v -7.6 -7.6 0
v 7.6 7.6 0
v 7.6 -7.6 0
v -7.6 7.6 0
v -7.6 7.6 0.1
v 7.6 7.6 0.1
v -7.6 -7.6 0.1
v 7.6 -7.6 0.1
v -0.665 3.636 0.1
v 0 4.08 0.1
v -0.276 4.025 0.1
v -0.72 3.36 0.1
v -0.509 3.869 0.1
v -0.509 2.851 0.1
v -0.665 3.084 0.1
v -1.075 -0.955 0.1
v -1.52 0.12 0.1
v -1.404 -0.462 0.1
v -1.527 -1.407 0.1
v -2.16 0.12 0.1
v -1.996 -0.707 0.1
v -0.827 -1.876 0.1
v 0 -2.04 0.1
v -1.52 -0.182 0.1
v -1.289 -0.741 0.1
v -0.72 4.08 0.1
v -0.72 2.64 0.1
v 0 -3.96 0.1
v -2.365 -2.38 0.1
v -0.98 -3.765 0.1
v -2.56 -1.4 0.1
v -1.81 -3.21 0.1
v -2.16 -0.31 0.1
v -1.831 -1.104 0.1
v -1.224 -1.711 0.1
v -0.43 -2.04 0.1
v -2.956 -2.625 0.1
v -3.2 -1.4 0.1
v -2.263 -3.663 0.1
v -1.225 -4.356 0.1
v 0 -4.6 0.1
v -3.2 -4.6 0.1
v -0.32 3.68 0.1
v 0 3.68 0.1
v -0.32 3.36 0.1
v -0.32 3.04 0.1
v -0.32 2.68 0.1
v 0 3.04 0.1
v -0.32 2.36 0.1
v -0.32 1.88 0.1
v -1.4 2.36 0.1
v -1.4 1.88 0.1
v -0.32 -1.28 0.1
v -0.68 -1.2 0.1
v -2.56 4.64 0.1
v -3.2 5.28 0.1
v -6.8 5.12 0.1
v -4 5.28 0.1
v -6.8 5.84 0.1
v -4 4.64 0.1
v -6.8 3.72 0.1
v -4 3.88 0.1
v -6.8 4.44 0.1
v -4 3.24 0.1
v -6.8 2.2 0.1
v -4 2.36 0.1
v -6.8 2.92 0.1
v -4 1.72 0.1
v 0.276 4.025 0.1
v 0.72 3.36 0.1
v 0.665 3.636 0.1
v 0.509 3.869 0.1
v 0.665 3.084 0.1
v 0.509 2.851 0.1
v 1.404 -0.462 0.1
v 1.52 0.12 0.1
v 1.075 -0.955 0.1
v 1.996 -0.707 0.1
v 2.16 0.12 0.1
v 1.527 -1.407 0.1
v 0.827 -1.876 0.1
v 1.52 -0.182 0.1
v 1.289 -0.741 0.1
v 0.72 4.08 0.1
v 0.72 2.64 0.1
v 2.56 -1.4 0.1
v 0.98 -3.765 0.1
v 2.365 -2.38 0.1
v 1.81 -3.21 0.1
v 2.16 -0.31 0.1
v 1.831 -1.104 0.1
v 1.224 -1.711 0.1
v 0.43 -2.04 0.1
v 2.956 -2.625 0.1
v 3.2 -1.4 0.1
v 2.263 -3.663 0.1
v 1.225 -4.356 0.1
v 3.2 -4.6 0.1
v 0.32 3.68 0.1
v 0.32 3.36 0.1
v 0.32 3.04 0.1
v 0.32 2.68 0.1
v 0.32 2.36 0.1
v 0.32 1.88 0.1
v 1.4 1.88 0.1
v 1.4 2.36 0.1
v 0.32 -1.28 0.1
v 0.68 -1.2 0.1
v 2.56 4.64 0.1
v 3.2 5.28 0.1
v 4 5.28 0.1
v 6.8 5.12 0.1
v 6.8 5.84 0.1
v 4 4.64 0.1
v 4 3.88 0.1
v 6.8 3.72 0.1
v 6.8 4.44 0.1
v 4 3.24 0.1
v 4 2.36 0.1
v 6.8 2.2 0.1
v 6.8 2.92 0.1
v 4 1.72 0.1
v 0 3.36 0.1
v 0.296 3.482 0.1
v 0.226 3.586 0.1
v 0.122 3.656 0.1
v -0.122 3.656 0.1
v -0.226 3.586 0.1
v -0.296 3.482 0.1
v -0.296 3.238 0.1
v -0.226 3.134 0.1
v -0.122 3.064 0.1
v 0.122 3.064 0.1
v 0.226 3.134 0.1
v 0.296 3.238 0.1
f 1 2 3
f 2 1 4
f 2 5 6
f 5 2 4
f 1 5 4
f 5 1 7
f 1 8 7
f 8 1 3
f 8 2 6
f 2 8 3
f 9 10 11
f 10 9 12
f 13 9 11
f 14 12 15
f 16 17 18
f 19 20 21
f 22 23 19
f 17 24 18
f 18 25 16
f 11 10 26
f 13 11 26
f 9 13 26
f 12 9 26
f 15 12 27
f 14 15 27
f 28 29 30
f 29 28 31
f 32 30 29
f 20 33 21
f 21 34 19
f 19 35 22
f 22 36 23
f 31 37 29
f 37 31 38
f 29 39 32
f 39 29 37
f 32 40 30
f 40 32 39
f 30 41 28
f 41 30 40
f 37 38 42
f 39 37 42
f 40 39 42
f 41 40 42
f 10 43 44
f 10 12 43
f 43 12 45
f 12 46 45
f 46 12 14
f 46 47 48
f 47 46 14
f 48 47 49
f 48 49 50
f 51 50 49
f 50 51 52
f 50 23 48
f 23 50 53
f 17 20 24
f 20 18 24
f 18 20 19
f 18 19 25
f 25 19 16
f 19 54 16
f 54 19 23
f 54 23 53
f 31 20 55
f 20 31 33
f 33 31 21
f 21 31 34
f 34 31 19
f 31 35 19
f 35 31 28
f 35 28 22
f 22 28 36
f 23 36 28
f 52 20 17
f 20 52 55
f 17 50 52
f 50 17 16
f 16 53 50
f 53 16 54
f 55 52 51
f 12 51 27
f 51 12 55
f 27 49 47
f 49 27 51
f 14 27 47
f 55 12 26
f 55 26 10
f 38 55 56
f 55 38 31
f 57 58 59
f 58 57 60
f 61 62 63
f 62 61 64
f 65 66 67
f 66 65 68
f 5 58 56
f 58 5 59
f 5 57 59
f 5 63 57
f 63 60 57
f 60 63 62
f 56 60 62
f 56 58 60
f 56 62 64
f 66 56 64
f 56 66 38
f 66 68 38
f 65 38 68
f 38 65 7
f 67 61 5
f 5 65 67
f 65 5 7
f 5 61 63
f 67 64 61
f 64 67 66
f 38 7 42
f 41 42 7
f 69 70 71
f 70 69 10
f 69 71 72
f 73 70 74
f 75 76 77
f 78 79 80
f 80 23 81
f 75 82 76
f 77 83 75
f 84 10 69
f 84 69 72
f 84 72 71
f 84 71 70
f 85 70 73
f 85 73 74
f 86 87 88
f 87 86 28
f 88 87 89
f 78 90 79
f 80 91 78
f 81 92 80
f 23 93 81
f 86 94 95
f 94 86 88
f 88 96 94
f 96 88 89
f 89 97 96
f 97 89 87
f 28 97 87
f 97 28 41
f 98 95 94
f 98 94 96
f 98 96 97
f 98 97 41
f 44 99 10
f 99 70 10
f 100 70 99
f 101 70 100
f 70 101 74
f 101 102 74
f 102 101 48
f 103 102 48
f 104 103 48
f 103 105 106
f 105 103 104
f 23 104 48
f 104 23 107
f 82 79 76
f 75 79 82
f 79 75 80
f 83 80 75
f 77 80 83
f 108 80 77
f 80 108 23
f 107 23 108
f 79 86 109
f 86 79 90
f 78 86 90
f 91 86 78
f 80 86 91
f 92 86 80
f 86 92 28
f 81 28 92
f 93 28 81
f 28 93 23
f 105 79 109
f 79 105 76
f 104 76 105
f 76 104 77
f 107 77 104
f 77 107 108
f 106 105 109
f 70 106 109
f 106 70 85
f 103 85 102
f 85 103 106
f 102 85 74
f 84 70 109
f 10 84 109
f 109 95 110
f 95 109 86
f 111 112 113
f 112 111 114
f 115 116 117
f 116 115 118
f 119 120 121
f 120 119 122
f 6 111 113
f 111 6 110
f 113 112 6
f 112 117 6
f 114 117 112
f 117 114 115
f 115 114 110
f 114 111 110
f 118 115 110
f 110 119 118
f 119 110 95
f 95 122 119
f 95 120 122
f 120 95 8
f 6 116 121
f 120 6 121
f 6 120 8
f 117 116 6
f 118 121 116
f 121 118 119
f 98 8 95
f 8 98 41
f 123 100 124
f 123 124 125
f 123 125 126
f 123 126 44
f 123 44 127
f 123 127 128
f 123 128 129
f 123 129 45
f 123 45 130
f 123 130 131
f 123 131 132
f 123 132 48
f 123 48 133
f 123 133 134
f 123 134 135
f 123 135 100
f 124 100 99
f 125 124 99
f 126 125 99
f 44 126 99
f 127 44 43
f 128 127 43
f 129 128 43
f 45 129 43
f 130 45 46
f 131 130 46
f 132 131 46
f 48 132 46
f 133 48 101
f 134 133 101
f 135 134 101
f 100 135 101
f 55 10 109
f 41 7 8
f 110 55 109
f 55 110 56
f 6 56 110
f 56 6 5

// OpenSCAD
// file: ../p/1-8tang.scad
use <../lib.scad>
function ldraw_lib__1_8tang() = [
// 0 Disc Negative Tangent 0.125
// 0 Name: 1-8tang.dat
// 0 Author: Steffen [Steffen]
// 0 !LDRAW_ORG Primitive UPDATE 2011-02
// 0 !LICENSE Licensed under CC BY 4.0 : see CAreadme.txt
// 
// 0 BFC CERTIFY CCW
  [0,"BFC","CERTIFY"],
  [0,"BFC","CCW"],
// 
// 0 !HISTORY 2005-08-03 [OrionP] Updated to conform to 1-4tang.dat
// 0 !HISTORY 2011-12-29 [PTadmin] Official Update 2011-02
// 
// 
// 3 16 1 0 0 1 0 0.1989 0.9239 0 0.3827
  [3,16,1,0,0,1,0,0.1989,0.9239,0,0.3827],
// 3 16 0.9239 0 0.3827 0.8478 0 0.5665 0.7071 0 0.7071
  [3,16,0.9239,0,0.3827,0.8478,0,0.5665,0.7071,0,0.7071],
];
module ldraw_lib__1_8tang(step=0, col=false, unit=2/5, alt=false, line=0.2, solid=!$preview)
    makepoly(ldraw_lib__1_8tang(), step=step, col=col, unit=unit, alt=alt, line=line, solid=solid);
ldraw_lib__1_8tang(line=0.2);
// file: ../p/1-8ndis.scad
use <../lib.scad>
function ldraw_lib__1_8ndis() = [
// 0 Disc Negative 0.125
// 0 Name: 1-8ndis.dat
// 0 Author: James Jessiman
// 0 !LDRAW_ORG Primitive UPDATE 2012-01
// 0 !LICENSE Licensed under CC BY 4.0 : see CAreadme.txt
// 
// 0 BFC CERTIFY CCW
  [0,"BFC","CERTIFY"],
  [0,"BFC","CCW"],
// 
// 0 !HISTORY 2002-03-23 [sbliss] Added BFC statement
// 0 !HISTORY 2002-04-25 [PTadmin] Official Update 2002-02
// 0 !HISTORY 2007-06-22 [PTadmin] Header formatted for Contributor Agreement
// 0 !HISTORY 2008-07-01 [PTadmin] Official Update 2008-01
// 0 !HISTORY 2012-02-16 [Philo] Changed to CCW
// 0 !HISTORY 2012-03-30 [PTadmin] Official Update 2012-01
// 
// 
// 3 16 0.9239 0 0.3827 1 0 0 1 0 1
  [3,16,0.9239,0,0.3827,1,0,0,1,0,1],
// 3 16 0.7071 0 0.7071 0.9239 0 0.3827 1 0 1
  [3,16,0.7071,0,0.7071,0.9239,0,0.3827,1,0,1],
];
module ldraw_lib__1_8ndis(step=0, col=false, unit=2/5, alt=false, line=0.2, solid=!$preview)
    makepoly(ldraw_lib__1_8ndis(), step=step, col=col, unit=unit, alt=alt, line=line, solid=solid);
ldraw_lib__1_8ndis(line=0.2);
// file: ../p/1-8chrd.scad
use <../lib.scad>
function ldraw_lib__1_8chrd() = [
// 0 Chord 0.125
// 0 Name: 1-8chrd.dat
// 0 Author: Orion Pobursky [OrionP]
// 0 !LDRAW_ORG Primitive UPDATE 2023-05
// 0 !LICENSE Licensed under CC BY 4.0 : see CAreadme.txt
// 
// 0 BFC CERTIFY CCW
  [0,"BFC","CERTIFY"],
  [0,"BFC","CCW"],
// 
// 0 !HISTORY 2004-04-22 [PTadmin] Official Update 2004-02
// 0 !HISTORY 2007-06-22 [PTadmin] Header formatted for Contributor Agreement
// 0 !HISTORY 2008-07-01 [PTadmin] Official Update 2008-01
// 0 !HISTORY 2023-10-27 [OrionP] Rebuilt with PrimGen2, original author westrate
// 0 !HISTORY 2023-10-31 [OrionP] Official Update 2023-05
// 
// 3 16 1 0 0 0.9239 0 0.3827 0.7071 0 0.7071
  [3,16,1,0,0,0.9239,0,0.3827,0.7071,0,0.7071],
];
module ldraw_lib__1_8chrd(step=0, col=false, unit=2/5, alt=false, line=0.2, solid=!$preview)
    makepoly(ldraw_lib__1_8chrd(), step=step, col=col, unit=unit, alt=alt, line=line, solid=solid);
ldraw_lib__1_8chrd(line=0.2);
// file: ../p/1-4tang.scad
use <../lib.scad>
function ldraw_lib__1_4tang() = [
// 0 Disc Negative Tangent 0.25
// 0 Name: 1-4tang.dat
// 0 Author: Willy Tschager [Holly-Wood]
// 0 !LDRAW_ORG Primitive UPDATE 2024-01
// 0 !LICENSE Licensed under CC BY 4.0 : see CAreadme.txt
// 
// 0 BFC CERTIFY CCW
  [0,"BFC","CERTIFY"],
  [0,"BFC","CCW"],
// 
// 0 !HISTORY 2011-12-29 [PTadmin] Official Update 2011-02
// 0 !HISTORY 2024-01-08 [Holly-Wood] Complete re-write, original by westrate
// 0 !HISTORY 2024-01-29 [OrionP] Official Update 2024-01
// 
// 3 16 0 0 1 0.3827 0 0.9239 0.1989 0 1
  [3,16,0,0,1,0.3827,0,0.9239,0.1989,0,1],
// 3 16 0.3827 0 0.9239 0.7071 0 0.7071 0.5665 0 0.8478
  [3,16,0.3827,0,0.9239,0.7071,0,0.7071,0.5665,0,0.8478],
// 3 16 0.7071 0 0.7071 0.9239 0 0.3827 0.8478 0 0.5665
  [3,16,0.7071,0,0.7071,0.9239,0,0.3827,0.8478,0,0.5665],
// 3 16 0.9239 0 0.3827 1 0 0 1 0 0.1989
  [3,16,0.9239,0,0.3827,1,0,0,1,0,0.1989],
];
module ldraw_lib__1_4tang(step=0, col=false, unit=2/5, alt=false, line=0.2, solid=!$preview)
    makepoly(ldraw_lib__1_4tang(), step=step, col=col, unit=unit, alt=alt, line=line, solid=solid);
ldraw_lib__1_4tang(line=0.2);
// file: ../p/1-4ring4.scad
use <../lib.scad>
function ldraw_lib__1_4ring4() = [
// 0 Ring  4 x 0.25
// 0 Name: 1-4ring4.dat
// 0 Author: Willy Tschager [Holly-Wood]
// 0 !LDRAW_ORG Primitive UPDATE 2024-01
// 0 !LICENSE Licensed under CC BY 4.0 : see CAreadme.txt
// 
// 0 BFC CERTIFY CCW
  [0,"BFC","CERTIFY"],
  [0,"BFC","CCW"],
// 
// 0 !HISTORY 2000-09-30 [PTadmin] Official Update 2000-02
// 0 !HISTORY 2003-08-01 [PTadmin] Official Update 2003-02
// 0 !HISTORY 2007-06-22 [PTadmin] Header formatted for Contributor Agreement
// 0 !HISTORY 2008-07-01 [PTadmin] Official Update 2008-01
// 0 !HISTORY 2012-02-16 [Philo] Changed to CCW
// 0 !HISTORY 2012-03-30 [PTadmin] Official Update 2012-01
// 0 !HISTORY 2024-01-06 [Holly-Wood] Complete regeneration, original by bbroich
// 0 !HISTORY 2024-01-29 [OrionP] Official Update 2024-01
// 
// 4 16 5 0 0 4.6195 0 1.9135 3.6956 0 1.5308 4 0 0
  [4,16,5,0,0,4.6195,0,1.9135,3.6956,0,1.5308,4,0,0],
// 4 16 4.6195 0 1.9135 3.5355 0 3.5355 2.8284 0 2.8284 3.6956 0 1.5308
  [4,16,4.6195,0,1.9135,3.5355,0,3.5355,2.8284,0,2.8284,3.6956,0,1.5308],
// 4 16 3.5355 0 3.5355 1.9135 0 4.6195 1.5308 0 3.6956 2.8284 0 2.8284
  [4,16,3.5355,0,3.5355,1.9135,0,4.6195,1.5308,0,3.6956,2.8284,0,2.8284],
// 4 16 1.9135 0 4.6195 0 0 5 0 0 4 1.5308 0 3.6956
  [4,16,1.9135,0,4.6195,0,0,5,0,0,4,1.5308,0,3.6956],
// 0 // Build by LDPartEditor (PrimGen 2.X)
];
module ldraw_lib__1_4ring4(step=0, col=false, unit=2/5, alt=false, line=0.2, solid=!$preview)
    makepoly(ldraw_lib__1_4ring4(), step=step, col=col, unit=unit, alt=alt, line=line, solid=solid);
ldraw_lib__1_4ring4(line=0.2);
// file: ../p/1-4ndis.scad
use <../lib.scad>
function ldraw_lib__1_4ndis() = [
// 0 Disc Negative 0.25
// 0 Name: 1-4ndis.dat
// 0 Author: James Jessiman
// 0 !LDRAW_ORG Primitive UPDATE 2012-01
// 0 !LICENSE Licensed under CC BY 4.0 : see CAreadme.txt
// 
// 0 BFC CERTIFY CCW
  [0,"BFC","CERTIFY"],
  [0,"BFC","CCW"],
// 
// 0 !HISTORY 2002-03-23 [sbliss] Added BFC Statement
// 0 !HISTORY 2002-04-25 [PTadmin] Official Update 2002-02
// 0 !HISTORY 2007-06-22 [PTadmin] Header formatted for Contributor Agreement
// 0 !HISTORY 2008-07-01 [PTadmin] Official Update 2008-01
// 0 !HISTORY 2012-02-16 [Philo] Changed to CCW
// 0 !HISTORY 2012-03-30 [PTadmin] Official Update 2012-01
// 
// 
// 3 16 0.9239 0 0.3827 1 0 0 1 0 1
  [3,16,0.9239,0,0.3827,1,0,0,1,0,1],
// 3 16 0.7071 0 0.7071 0.9239 0 0.3827 1 0 1
  [3,16,0.7071,0,0.7071,0.9239,0,0.3827,1,0,1],
// 3 16 0.3827 0 0.9239 0.7071 0 0.7071 1 0 1
  [3,16,0.3827,0,0.9239,0.7071,0,0.7071,1,0,1],
// 3 16 0 0 1 0.3827 0 0.9239 1 0 1
  [3,16,0,0,1,0.3827,0,0.9239,1,0,1],
];
module ldraw_lib__1_4ndis(step=0, col=false, unit=2/5, alt=false, line=0.2, solid=!$preview)
    makepoly(ldraw_lib__1_4ndis(), step=step, col=col, unit=unit, alt=alt, line=line, solid=solid);
ldraw_lib__1_4ndis(line=0.2);
// file: ../p/1-4chrd.scad
use <../lib.scad>
function ldraw_lib__1_4chrd() = [
// 0 Chord 0.25
// 0 Name: 1-4chrd.dat
// 0 Author: Max Martin Richter [MMR1988]
// 0 !LDRAW_ORG Primitive UPDATE 2023-05
// 0 !LICENSE Licensed under CC BY 4.0 : see CAreadme.txt
// 
// 0 BFC CERTIFY CCW
  [0,"BFC","CERTIFY"],
  [0,"BFC","CCW"],
// 
// 0 !HISTORY 2004-04-22 [PTadmin] Official Update 2004-02
// 0 !HISTORY 2007-10-09 [PTadmin] Header formatted for Contributor Agreement
// 0 !HISTORY 2008-07-01 [PTadmin] Official Update 2008-01
// 0 !HISTORY 2012-08-02 [MMR1988] Re-creation with PrimGen2 and Rectifier
// 0 !HISTORY 2012-08-09 [PTadmin] Official Update 2012-02
// 0 !HISTORY 2023-10-27 [OrionP] Change author to MMR1988 from hafhead
// 0 !HISTORY 2023-10-31 [OrionP] Official Update 2023-05
// 
// 4 16 0.9239 0 0.3827 0.3827 0 0.9239 0 0 1 1 0 0
  [4,16,0.9239,0,0.3827,0.3827,0,0.9239,0,0,1,1,0,0],
// 3 16 0.7071 0 0.7071 0.3827 0 0.9239 0.9239 0 0.3827
  [3,16,0.7071,0,0.7071,0.3827,0,0.9239,0.9239,0,0.3827],
];
module ldraw_lib__1_4chrd(step=0, col=false, unit=2/5, alt=false, line=0.2, solid=!$preview)
    makepoly(ldraw_lib__1_4chrd(), step=step, col=col, unit=unit, alt=alt, line=line, solid=solid);
ldraw_lib__1_4chrd(line=0.2);
// file: s/165985ds01.scad
use <../../lib.scad>
use <../../p/1-4chrd.scad>
use <../../p/1-4ndis.scad>
use <../../p/1-4ring4.scad>
use <../../p/1-4tang.scad>
use <../../p/1-8chrd.scad>
use <../../p/1-8ndis.scad>
use <../../p/1-8tang.scad>
function ldraw_lib__s__165985ds01() = [
// 0 ~Sticker  1.9 x  1.9 with Anchor and Green, Yellow, and Light Grey Stripes - Half
// 0 Name: s\165985ds01.dat
// 0 Author: Takeshi Takahashi [RainbowDolphin]
// 0 !LDRAW_ORG Subpart UPDATE 2026-05
// 0 !LICENSE Licensed under CC BY 4.0 : see CAreadme.txt
// 
// 0 BFC CERTIFY CCW
  [0,"BFC","CERTIFY"],
  [0,"BFC","CCW"],
// 
// 0 !HISTORY 2026-05-31 [OrionP] Official Update 2026-05
// 
// 1 0 0 0 8.4 0 0 -1.8 0 1 0 1.8 0 0 1-4chrd.dat
  [1,0,0,0,8.4,0,0,-1.8,0,1,0,1.8,0,0, ldraw_lib__1_4chrd()],
// 1 0 0 0 8.4 -1.8 0 0 0 1 0 0 0 -1.8 1-8chrd.dat
  [1,0,0,0,8.4,-1.8,0,0,0,1,0,0,0,-1.8, ldraw_lib__1_8chrd()],
// 1 7 0 0 .3 -3.8 0 0 0 1 0 0 0 -3.8 1-8chrd.dat
  [1,7,0,0,.3,-3.8,0,0,0,1,0,0,0,-3.8, ldraw_lib__1_8chrd()],
// 1 0 0 0 .3 -5.4 0 0 0 1 0 0 0 -5.4 1-8chrd.dat
  [1,0,0,0,.3,-5.4,0,0,0,1,0,0,0,-5.4, ldraw_lib__1_8chrd()],
// 1 0 0 0 .3 0 0 -5.4 0 1 0 -5.4 0 0 1-8chrd.dat
  [1,0,0,0,.3,0,0,-5.4,0,1,0,-5.4,0,0, ldraw_lib__1_8chrd()],
// 1 0 0 0 .3 -3.8 0 0 0 1 0 0 0 -3.8 1-8tang.dat
  [1,0,0,0,.3,-3.8,0,0,0,1,0,0,0,-3.8, ldraw_lib__1_8tang()],
// 1 7 0 0 8.4 0 0 -1.8 0 1 0 1.8 0 0 1-4ndis.dat
  [1,7,0,0,8.4,0,0,-1.8,0,1,0,1.8,0,0, ldraw_lib__1_4ndis()],
// 1 7 0 0 8.4 -1.8 0 0 0 1 0 0 0 -1.8 1-8ndis.dat
  [1,7,0,0,8.4,-1.8,0,0,0,1,0,0,0,-1.8, ldraw_lib__1_8ndis()],
// 1 7 0 0 -3.5 -6.4 0 0 0 1 0 0 0 -6.4 1-4chrd.dat
  [1,7,0,0,-3.5,-6.4,0,0,0,1,0,0,0,-6.4, ldraw_lib__1_4chrd()],
// 1 7 0 0 .3 -5.4 0 0 0 1 0 0 0 -5.4 1-4tang.dat
  [1,7,0,0,.3,-5.4,0,0,0,1,0,0,0,-5.4, ldraw_lib__1_4tang()],
// 1 2 0 0 -3.5 -1.6 0 0 0 1 0 0 0 -1.6 1-4ring4.dat
  [1,2,0,0,-3.5,-1.6,0,0,0,1,0,0,0,-1.6, ldraw_lib__1_4ring4()],
// 1 0 0 0 -3.5 -8 0 0 0 1 0 0 0 -8 1-4ndis.dat
  [1,0,0,0,-3.5,-8,0,0,0,1,0,0,0,-8, ldraw_lib__1_4ndis()],
// 3 0 0 0 10.2 -.8 0 9.2 0 0 9.2
  [3,0,0,0,10.2,-.8,0,9.2,0,0,9.2],
// 3 0 0 0 10.2 -1.8 0 8.4 -.8 0 9.2
  [3,0,0,0,10.2,-1.8,0,8.4,-.8,0,9.2],
// 3 0 -.8 0 9.2 -1.8 0 8.4 -.8 0 8.4
  [3,0,-.8,0,9.2,-1.8,0,8.4,-.8,0,8.4],
// 4 0 -.8 0 7.6 -.8 0 8.4 -1.8 0 8.4 -1.27278 0 7.12722
  [4,0,-.8,0,7.6,-.8,0,8.4,-1.8,0,8.4,-1.27278,0,7.12722],
// 4 0 0 0 7.6 -.8 0 7.6 -1.27278 0 7.12722 -.8 0 6.7
  [4,0,0,0,7.6,-.8,0,7.6,-1.27278,0,7.12722,-.8,0,6.7],
// 3 0 0 0 7.6 -.8 0 6.7 -.8 0 5.9
  [3,0,0,0,7.6,-.8,0,6.7,-.8,0,5.9],
// 3 0 0 0 7.6 -.8 0 5.9 -.8 0 4.7
  [3,0,0,0,7.6,-.8,0,5.9,-.8,0,4.7],
// 4 0 -.8 0 4.7 -.8 0 5.9 -3.5 0 5.9 -3.5 0 4.7
  [4,0,-.8,0,4.7,-.8,0,5.9,-3.5,0,5.9,-3.5,0,4.7],
// 4 0 0 0 7.6 -.8 0 4.7 -.8 0 -3.2 0 0 -5.1
  [4,0,0,0,7.6,-.8,0,4.7,-.8,0,-3.2,0,0,-5.1],
// 3 0 -3.8 0 .3 -5.4 0 .3 -3.8 0 -.45582
  [3,0,-3.8,0,.3,-5.4,0,.3,-3.8,0,-.45582],
// 4 0 -3.51082 0 -1.15426 -3.8 0 -.45582 -5.4 0 .3 -3.81834 0 -3.51834
  [4,0,-3.51082,0,-1.15426,-3.8,0,-.45582,-5.4,0,.3,-3.81834,0,-3.51834],
// 3 0 -3.51082 0 -1.15426 -3.81834 0 -3.51834 -3.22164 0 -1.8527
  [3,0,-3.51082,0,-1.15426,-3.81834,0,-3.51834,-3.22164,0,-1.8527],
// 3 0 -3.22164 0 -1.8527 -3.81834 0 -3.51834 -2.68698 0 -2.38698
  [3,0,-3.22164,0,-1.8527,-3.81834,0,-3.51834,-2.68698,0,-2.38698],
// 4 0 -1.7 0 -3 -2.68698 0 -2.38698 -3.81834 0 -3.51834 0 0 -5.1
  [4,0,-1.7,0,-3,-2.68698,0,-2.38698,-3.81834,0,-3.51834,0,0,-5.1],
// 3 0 -1.7 0 -3 0 0 -5.1 -.8 0 -3.2
  [3,0,-1.7,0,-3,0,0,-5.1,-.8,0,-3.2],
// 4 7 -5.4 0 .3 -6.4 0 11.6 -6.4 0 -3.5 -5.4 0 -.77406
  [4,7,-5.4,0,.3,-6.4,0,11.6,-6.4,0,-3.5,-5.4,0,-.77406],
// 3 7 -5.4 0 -.77406 -6.4 0 -3.5 -4.98906 0 -1.76658
  [3,7,-5.4,0,-.77406,-6.4,0,-3.5,-4.98906,0,-1.76658],
// 3 7 -4.98906 0 -1.76658 -6.4 0 -3.5 -4.57812 0 -2.7591
  [3,7,-4.98906,0,-1.76658,-6.4,0,-3.5,-4.57812,0,-2.7591],
// 3 7 -4.57812 0 -2.7591 -6.4 0 -3.5 -3.81834 0 -3.51834
  [3,7,-4.57812,0,-2.7591,-6.4,0,-3.5,-3.81834,0,-3.51834],
// 4 7 -3.0591 0 -4.27812 -3.81834 0 -3.51834 -6.4 0 -3.5 0 0 -9.9
  [4,7,-3.0591,0,-4.27812,-3.81834,0,-3.51834,-6.4,0,-3.5,0,0,-9.9],
// 3 7 -3.0591 0 -4.27812 0 0 -9.9 -2.06658 0 -4.68906
  [3,7,-3.0591,0,-4.27812,0,0,-9.9,-2.06658,0,-4.68906],
// 3 7 -2.06658 0 -4.68906 0 0 -9.9 -1.07406 0 -5.1
  [3,7,-2.06658,0,-4.68906,0,0,-9.9,-1.07406,0,-5.1],
// 3 7 0 0 -5.1 -1.07406 0 -5.1 0 0 -9.9
  [3,7,0,0,-5.1,-1.07406,0,-5.1,0,0,-9.9],
// 4 7 -6.4 0 11.6 -5.4 0 .3 -3.8 0 .3 -3.5 0 4.7
  [4,7,-6.4,0,11.6,-5.4,0,.3,-3.8,0,.3,-3.5,0,4.7],
// 4 7 -.8 0 4.7 -3.5 0 4.7 -3.8 0 .3 -2.68698 0 -2.38698
  [4,7,-.8,0,4.7,-3.5,0,4.7,-3.8,0,.3,-2.68698,0,-2.38698],
// 4 7 -.8 0 4.7 -2.68698 0 -2.38698 -1.7 0 -3 -.8 0 -3.2
  [4,7,-.8,0,4.7,-2.68698,0,-2.38698,-1.7,0,-3,-.8,0,-3.2],
// 3 7 -6.4 0 11.6 -3.5 0 4.7 -3.5 0 5.9
  [3,7,-6.4,0,11.6,-3.5,0,4.7,-3.5,0,5.9],
// 4 7 -6.4 0 11.6 -3.5 0 5.9 -1.8 0 6.6 -1.8 0 8.4
  [4,7,-6.4,0,11.6,-3.5,0,5.9,-1.8,0,6.6,-1.8,0,8.4],
// 4 7 -1.8 0 6.6 -3.5 0 5.9 -.8 0 5.9 -.8 0 6.7
  [4,7,-1.8,0,6.6,-3.5,0,5.9,-.8,0,5.9,-.8,0,6.7],
// 3 7 -1.27278 0 7.12722 -1.8 0 6.6 -.8 0 6.7
  [3,7,-1.27278,0,7.12722,-1.8,0,6.6,-.8,0,6.7],
// 3 7 -6.4 0 11.6 -1.8 0 8.4 -1.8 0 10.2
  [3,7,-6.4,0,11.6,-1.8,0,8.4,-1.8,0,10.2],
// 3 7 -6.4 0 11.6 -1.8 0 10.2 0 0 10.2
  [3,7,-6.4,0,11.6,-1.8,0,10.2,0,0,10.2],
// 4 2 -8 0 -3.5 -6.4 0 -3.5 -6.4 0 11.6 -8 0 13.2
  [4,2,-8,0,-3.5,-6.4,0,-3.5,-6.4,0,11.6,-8,0,13.2],
// 4 2 -10 0 13.2 -17 0 14.6 -17 0 12.8 -10 0 11.6
  [4,2,-10,0,13.2,-17,0,14.6,-17,0,12.8,-10,0,11.6],
// 4 14 -10 0 9.7 -17 0 11.1 -17 0 9.3 -10 0 8.1
  [4,14,-10,0,9.7,-17,0,11.1,-17,0,9.3,-10,0,8.1],
// 4 7 -10 0 5.9 -17 0 7.3 -17 0 5.5 -10 0 4.3
  [4,7,-10,0,5.9,-17,0,7.3,-17,0,5.5,-10,0,4.3],
// 4 0 -19 0 19 -17 0 14.6 -10 0 13.2 -8 0 13.2
  [4,0,-19,0,19,-17,0,14.6,-10,0,13.2,-8,0,13.2],
// 3 0 -19 0 19 -17 0 12.8 -17 0 14.6
  [3,0,-19,0,19,-17,0,12.8,-17,0,14.6],
// 3 0 -19 0 19 -17 0 11.1 -17 0 12.8
  [3,0,-19,0,19,-17,0,11.1,-17,0,12.8],
// 4 0 -10 0 11.6 -17 0 12.8 -17 0 11.1 -10 0 9.7
  [4,0,-10,0,11.6,-17,0,12.8,-17,0,11.1,-10,0,9.7],
// 3 0 -8 0 13.2 -10 0 11.6 -10 0 9.7
  [3,0,-8,0,13.2,-10,0,11.6,-10,0,9.7],
// 3 0 -8 0 13.2 -10 0 13.2 -10 0 11.6
  [3,0,-8,0,13.2,-10,0,13.2,-10,0,11.6],
// 3 0 -8 0 13.2 -10 0 9.7 -10 0 8.1
  [3,0,-8,0,13.2,-10,0,9.7,-10,0,8.1],
// 4 0 -8 0 13.2 -10 0 8.1 -10 0 5.9 -8 0 -3.5
  [4,0,-8,0,13.2,-10,0,8.1,-10,0,5.9,-8,0,-3.5],
// 3 0 -10 0 5.9 -10 0 4.3 -8 0 -3.5
  [3,0,-10,0,5.9,-10,0,4.3,-8,0,-3.5],
// 4 0 -8 0 -3.5 -10 0 4.3 -17 0 5.5 -19 0 -19
  [4,0,-8,0,-3.5,-10,0,4.3,-17,0,5.5,-19,0,-19],
// 3 0 -17 0 7.3 -17 0 9.3 -19 0 19
  [3,0,-17,0,7.3,-17,0,9.3,-19,0,19],
// 4 0 -19 0 19 -19 0 -19 -17 0 5.5 -17 0 7.3
  [4,0,-19,0,19,-19,0,-19,-17,0,5.5,-17,0,7.3],
// 3 0 -19 0 19 -17 0 9.3 -17 0 11.1
  [3,0,-19,0,19,-17,0,9.3,-17,0,11.1],
// 4 0 -10 0 8.1 -17 0 9.3 -17 0 7.3 -10 0 5.9
  [4,0,-10,0,8.1,-17,0,9.3,-17,0,7.3,-10,0,5.9],
// 3 0 -8 0 -3.5 -19 0 -19 -8 0 -11.5
  [3,0,-8,0,-3.5,-19,0,-19,-8,0,-11.5],
// 3 0 0 0 -11.5 -8 0 -11.5 -19 0 -19
  [3,0,0,0,-11.5,-8,0,-11.5,-19,0,-19],
];
module ldraw_lib__s__165985ds01(step=0, col=false, unit=2/5, alt=false, line=0.2, solid=!$preview)
    makepoly(ldraw_lib__s__165985ds01(), step=step, col=col, unit=unit, alt=alt, line=line, solid=solid);
ldraw_lib__s__165985ds01(line=0.2);
// file: ../p/box5-12.scad
use <../lib.scad>
function ldraw_lib__box5_12() = [
// 0 Box with 5 Faces without Any Edges
// 0 Name: box5-12.dat
// 0 Author: Chris Dee [cwdee]
// 0 !LDRAW_ORG Primitive UPDATE 2009-02
// 0 !LICENSE Licensed under CC BY 4.0 : see CAreadme.txt
// 
// 0 BFC CERTIFY CCW
  [0,"BFC","CERTIFY"],
  [0,"BFC","CCW"],
// 
// 0 !HISTORY 2009-09-03 [PTadmin] Official Update 2009-02
// 
// 
// 4 16 1 1 1 1 1 -1 -1 1 -1 -1 1 1
  [4,16,1,1,1,1,1,-1,-1,1,-1,-1,1,1],
// 4 16 -1 0 1 1 0 1 1 1 1 -1 1 1
  [4,16,-1,0,1,1,0,1,1,1,1,-1,1,1],
// 4 16 -1 0 -1 -1 0 1 -1 1 1 -1 1 -1
  [4,16,-1,0,-1,-1,0,1,-1,1,1,-1,1,-1],
// 4 16 1 0 -1 -1 0 -1 -1 1 -1 1 1 -1
  [4,16,1,0,-1,-1,0,-1,-1,1,-1,1,1,-1],
// 4 16 1 0 1 1 0 -1 1 1 -1 1 1 1
  [4,16,1,0,1,1,0,-1,1,1,-1,1,1,1],
// 0
];
module ldraw_lib__box5_12(step=0, col=false, unit=2/5, alt=false, line=0.2, solid=!$preview)
    makepoly(ldraw_lib__box5_12(), step=step, col=col, unit=unit, alt=alt, line=line, solid=solid);
ldraw_lib__box5_12(line=0.2);
// file: ../p/4-4ndis.scad
use <../lib.scad>
function ldraw_lib__4_4ndis() = [
// 0 Disc Negative 1.0
// 0 Name: 4-4ndis.dat
// 0 Author: James Jessiman
// 0 !LDRAW_ORG Primitive UPDATE 2012-01
// 0 !LICENSE Licensed under CC BY 4.0 : see CAreadme.txt
// 
// 0 BFC CERTIFY CCW
  [0,"BFC","CERTIFY"],
  [0,"BFC","CCW"],
// 
// 0 !HISTORY 2002-03-23 [sbliss] Added BFC statement; compacted code
// 0 !HISTORY 2002-04-25 [PTadmin] Official Update 2002-02
// 0 !HISTORY 2007-06-24 [PTadmin] Header formatted for Contributor Agreement
// 0 !HISTORY 2008-07-01 [PTadmin] Official Update 2008-01
// 0 !HISTORY 2012-02-16 [Philo] Changed to CCW
// 0 !HISTORY 2012-03-30 [PTadmin] Official Update 2012-01
// 
// 
// 3 16 0.9239 0 0.3827 1 0 0 1 0 1
  [3,16,0.9239,0,0.3827,1,0,0,1,0,1],
// 3 16 0.7071 0 0.7071 0.9239 0 0.3827 1 0 1
  [3,16,0.7071,0,0.7071,0.9239,0,0.3827,1,0,1],
// 3 16 0.3827 0 0.9239 0.7071 0 0.7071 1 0 1
  [3,16,0.3827,0,0.9239,0.7071,0,0.7071,1,0,1],
// 3 16 0 0 1 0.3827 0 0.9239 1 0 1
  [3,16,0,0,1,0.3827,0,0.9239,1,0,1],
// 3 16 -0.3827 0 0.9239 0 0 1 -1 0 1
  [3,16,-0.3827,0,0.9239,0,0,1,-1,0,1],
// 3 16 -0.7071 0 0.7071 -0.3827 0 0.9239 -1 0 1
  [3,16,-0.7071,0,0.7071,-0.3827,0,0.9239,-1,0,1],
// 3 16 -0.9239 0 0.3827 -0.7071 0 0.7071 -1 0 1
  [3,16,-0.9239,0,0.3827,-0.7071,0,0.7071,-1,0,1],
// 3 16 -1 0 0 -0.9239 0 0.3827 -1 0 1
  [3,16,-1,0,0,-0.9239,0,0.3827,-1,0,1],
// 3 16 -0.9239 0 -0.3827 -1 0 0 -1 0 -1
  [3,16,-0.9239,0,-0.3827,-1,0,0,-1,0,-1],
// 3 16 -0.7071 0 -0.7071 -0.9239 0 -0.3827 -1 0 -1
  [3,16,-0.7071,0,-0.7071,-0.9239,0,-0.3827,-1,0,-1],
// 3 16 -0.3827 0 -0.9239 -0.7071 0 -0.7071 -1 0 -1
  [3,16,-0.3827,0,-0.9239,-0.7071,0,-0.7071,-1,0,-1],
// 3 16 0 0 -1 -0.3827 0 -0.9239 -1 0 -1
  [3,16,0,0,-1,-0.3827,0,-0.9239,-1,0,-1],
// 3 16 0.3827 0 -0.9239 0 0 -1 1 0 -1
  [3,16,0.3827,0,-0.9239,0,0,-1,1,0,-1],
// 3 16 0.7071 0 -0.7071 0.3827 0 -0.9239 1 0 -1
  [3,16,0.7071,0,-0.7071,0.3827,0,-0.9239,1,0,-1],
// 3 16 0.9239 0 -0.3827 0.7071 0 -0.7071 1 0 -1
  [3,16,0.9239,0,-0.3827,0.7071,0,-0.7071,1,0,-1],
// 3 16 1 0 0 0.9239 0 -0.3827 1 0 -1
  [3,16,1,0,0,0.9239,0,-0.3827,1,0,-1],
];
module ldraw_lib__4_4ndis(step=0, col=false, unit=2/5, alt=false, line=0.2, solid=!$preview)
    makepoly(ldraw_lib__4_4ndis(), step=step, col=col, unit=unit, alt=alt, line=line, solid=solid);
ldraw_lib__4_4ndis(line=0.2);
// file: ../p/4-4disc.scad
use <../lib.scad>
function ldraw_lib__4_4disc() = [
// 0 Disc 1.0
// 0 Name: 4-4disc.dat
// 0 Author: James Jessiman
// 0 !LDRAW_ORG Primitive UPDATE 2002-02
// 0 !LICENSE Licensed under CC BY 4.0 : see CAreadme.txt
// 
// 0 BFC CERTIFY CCW
  [0,"BFC","CERTIFY"],
  [0,"BFC","CCW"],
// 
// 0 !HISTORY 1998-12-15 [PTadmin] Official Update 1998-10
// 0 !HISTORY 2002-03-23 [sbliss] Added BFC statement
// 0 !HISTORY 2002-04-25 [PTadmin] Official Update 2002-02
// 0 !HISTORY 2007-06-24 [PTadmin] Header formatted for Contributor Agreement
// 0 !HISTORY 2008-07-01 [PTadmin] Official Update 2008-01
// 
// 
// 3 16 0 0 0 1 0 0 0.9239 0 0.3827
  [3,16,0,0,0,1,0,0,0.9239,0,0.3827],
// 3 16 0 0 0 0.9239 0 0.3827 0.7071 0 0.7071
  [3,16,0,0,0,0.9239,0,0.3827,0.7071,0,0.7071],
// 3 16 0 0 0 0.7071 0 0.7071 0.3827 0 0.9239
  [3,16,0,0,0,0.7071,0,0.7071,0.3827,0,0.9239],
// 3 16 0 0 0 0.3827 0 0.9239 0 0 1
  [3,16,0,0,0,0.3827,0,0.9239,0,0,1],
// 3 16 0 0 0 0 0 1 -0.3827 0 0.9239
  [3,16,0,0,0,0,0,1,-0.3827,0,0.9239],
// 3 16 0 0 0 -0.3827 0 0.9239 -0.7071 0 0.7071
  [3,16,0,0,0,-0.3827,0,0.9239,-0.7071,0,0.7071],
// 3 16 0 0 0 -0.7071 0 0.7071 -0.9239 0 0.3827
  [3,16,0,0,0,-0.7071,0,0.7071,-0.9239,0,0.3827],
// 3 16 0 0 0 -0.9239 0 0.3827 -1 0 -0
  [3,16,0,0,0,-0.9239,0,0.3827,-1,0,-0],
// 3 16 0 0 0 -1 0 -0 -0.9239 0 -0.3827
  [3,16,0,0,0,-1,0,-0,-0.9239,0,-0.3827],
// 3 16 0 0 0 -0.9239 0 -0.3827 -0.7071 0 -0.7071
  [3,16,0,0,0,-0.9239,0,-0.3827,-0.7071,0,-0.7071],
// 3 16 0 0 0 -0.7071 0 -0.7071 -0.3827 0 -0.9239
  [3,16,0,0,0,-0.7071,0,-0.7071,-0.3827,0,-0.9239],
// 3 16 0 0 0 -0.3827 0 -0.9239 0 0 -1
  [3,16,0,0,0,-0.3827,0,-0.9239,0,0,-1],
// 3 16 0 0 0 0 0 -1 0.3827 0 -0.9239
  [3,16,0,0,0,0,0,-1,0.3827,0,-0.9239],
// 3 16 0 0 0 0.3827 0 -0.9239 0.7071 0 -0.7071
  [3,16,0,0,0,0.3827,0,-0.9239,0.7071,0,-0.7071],
// 3 16 0 0 0 0.7071 0 -0.7071 0.9239 0 -0.3827
  [3,16,0,0,0,0.7071,0,-0.7071,0.9239,0,-0.3827],
// 3 16 0 0 0 0.9239 0 -0.3827 1 0 0
  [3,16,0,0,0,0.9239,0,-0.3827,1,0,0],
// 0
];
module ldraw_lib__4_4disc(step=0, col=false, unit=2/5, alt=false, line=0.2, solid=!$preview)
    makepoly(ldraw_lib__4_4disc(), step=step, col=col, unit=unit, alt=alt, line=line, solid=solid);
ldraw_lib__4_4disc(line=0.2);
// main file
use <../lib.scad>
use <../p/4-4disc.scad>
use <../p/4-4ndis.scad>
use <../p/box5-12.scad>
use <s/165985ds01.scad>
function ldraw_lib__165985d() = [
// 0 Sticker  1.9 x  1.9 with Anchor and Green, Yellow, and Light Grey Stripes
// 0 Name: 165985d.dat
// 0 Author: Takeshi Takahashi [RainbowDolphin]
// 0 !LDRAW_ORG Part UPDATE 2026-05
// 0 !LICENSE Licensed under CC BY 4.0 : see CAreadme.txt
// 
// 0 BFC CERTIFY CCW
  [0,"BFC","CERTIFY"],
  [0,"BFC","CCW"],
// 
// 0 !KEYWORDS Bricklink 8839stk01, Brickowl 289279, Rebrickable stickerupn0074
// 0 !KEYWORDS set 8839, Supply ship, Technic
// 
// 0 !HISTORY 2026-05-31 [OrionP] Official Update 2026-05
// 
// 1 16 0 -0.25 0 19 0 0 0 0.25 0 0 0 19 box5-12.dat
  [1,16,0,-0.25,0,19,0,0,0,0.25,0,0,0,19, ldraw_lib__box5_12()],
// 
// 1 16 0 -.25 0 1 0 0 0 1 0 0 0 1 s\165985ds01.dat
  [1,16,0,-.25,0,1,0,0,0,1,0,0,0,1, ldraw_lib__s__165985ds01()],
// 1 16 0 -.25 0 -1 0 0 0 1 0 0 0 1 s\165985ds01.dat
  [1,16,0,-.25,0,-1,0,0,0,1,0,0,0,1, ldraw_lib__s__165985ds01()],
// 1 7 0 -0.25 8.4 0.8 0 0 0 1 0 0 0 0.8 4-4disc.dat
  [1,7,0,-0.25,8.4,0.8,0,0,0,1,0,0,0,0.8, ldraw_lib__4_4disc()],
// 1 0 0 -0.25 8.4 0.8 0 0 0 1 0 0 0 0.8 4-4ndis.dat
  [1,0,0,-0.25,8.4,0.8,0,0,0,1,0,0,0,0.8, ldraw_lib__4_4ndis()],
// 3 7 -6.4 -.25 11.6 0 -.25 10.2 6.4 -.25 11.6
  [3,7,-6.4,-.25,11.6,0,-.25,10.2,6.4,-.25,11.6],
// 3 0 0 -.25 -11.5 -19 -.25 -19 19 -.25 -19
  [3,0,0,-.25,-11.5,-19,-.25,-19,19,-.25,-19],
// 4 2 -8 -.25 13.2 -6.4 -.25 11.6 6.4 -.25 11.6 8 -.25 13.2
  [4,2,-8,-.25,13.2,-6.4,-.25,11.6,6.4,-.25,11.6,8,-.25,13.2],
// 4 0 -19 -.25 19 -8 -.25 13.2 8 -.25 13.2 19 -.25 19
  [4,0,-19,-.25,19,-8,-.25,13.2,8,-.25,13.2,19,-.25,19],
];
module ldraw_lib__165985d(step=0, col=false, unit=2/5, alt=false, line=0.2, solid=!$preview)
    makepoly(ldraw_lib__165985d(), step=step, col=col, unit=unit, alt=alt, line=line, solid=solid);
ldraw_lib__165985d(line=0.2);
